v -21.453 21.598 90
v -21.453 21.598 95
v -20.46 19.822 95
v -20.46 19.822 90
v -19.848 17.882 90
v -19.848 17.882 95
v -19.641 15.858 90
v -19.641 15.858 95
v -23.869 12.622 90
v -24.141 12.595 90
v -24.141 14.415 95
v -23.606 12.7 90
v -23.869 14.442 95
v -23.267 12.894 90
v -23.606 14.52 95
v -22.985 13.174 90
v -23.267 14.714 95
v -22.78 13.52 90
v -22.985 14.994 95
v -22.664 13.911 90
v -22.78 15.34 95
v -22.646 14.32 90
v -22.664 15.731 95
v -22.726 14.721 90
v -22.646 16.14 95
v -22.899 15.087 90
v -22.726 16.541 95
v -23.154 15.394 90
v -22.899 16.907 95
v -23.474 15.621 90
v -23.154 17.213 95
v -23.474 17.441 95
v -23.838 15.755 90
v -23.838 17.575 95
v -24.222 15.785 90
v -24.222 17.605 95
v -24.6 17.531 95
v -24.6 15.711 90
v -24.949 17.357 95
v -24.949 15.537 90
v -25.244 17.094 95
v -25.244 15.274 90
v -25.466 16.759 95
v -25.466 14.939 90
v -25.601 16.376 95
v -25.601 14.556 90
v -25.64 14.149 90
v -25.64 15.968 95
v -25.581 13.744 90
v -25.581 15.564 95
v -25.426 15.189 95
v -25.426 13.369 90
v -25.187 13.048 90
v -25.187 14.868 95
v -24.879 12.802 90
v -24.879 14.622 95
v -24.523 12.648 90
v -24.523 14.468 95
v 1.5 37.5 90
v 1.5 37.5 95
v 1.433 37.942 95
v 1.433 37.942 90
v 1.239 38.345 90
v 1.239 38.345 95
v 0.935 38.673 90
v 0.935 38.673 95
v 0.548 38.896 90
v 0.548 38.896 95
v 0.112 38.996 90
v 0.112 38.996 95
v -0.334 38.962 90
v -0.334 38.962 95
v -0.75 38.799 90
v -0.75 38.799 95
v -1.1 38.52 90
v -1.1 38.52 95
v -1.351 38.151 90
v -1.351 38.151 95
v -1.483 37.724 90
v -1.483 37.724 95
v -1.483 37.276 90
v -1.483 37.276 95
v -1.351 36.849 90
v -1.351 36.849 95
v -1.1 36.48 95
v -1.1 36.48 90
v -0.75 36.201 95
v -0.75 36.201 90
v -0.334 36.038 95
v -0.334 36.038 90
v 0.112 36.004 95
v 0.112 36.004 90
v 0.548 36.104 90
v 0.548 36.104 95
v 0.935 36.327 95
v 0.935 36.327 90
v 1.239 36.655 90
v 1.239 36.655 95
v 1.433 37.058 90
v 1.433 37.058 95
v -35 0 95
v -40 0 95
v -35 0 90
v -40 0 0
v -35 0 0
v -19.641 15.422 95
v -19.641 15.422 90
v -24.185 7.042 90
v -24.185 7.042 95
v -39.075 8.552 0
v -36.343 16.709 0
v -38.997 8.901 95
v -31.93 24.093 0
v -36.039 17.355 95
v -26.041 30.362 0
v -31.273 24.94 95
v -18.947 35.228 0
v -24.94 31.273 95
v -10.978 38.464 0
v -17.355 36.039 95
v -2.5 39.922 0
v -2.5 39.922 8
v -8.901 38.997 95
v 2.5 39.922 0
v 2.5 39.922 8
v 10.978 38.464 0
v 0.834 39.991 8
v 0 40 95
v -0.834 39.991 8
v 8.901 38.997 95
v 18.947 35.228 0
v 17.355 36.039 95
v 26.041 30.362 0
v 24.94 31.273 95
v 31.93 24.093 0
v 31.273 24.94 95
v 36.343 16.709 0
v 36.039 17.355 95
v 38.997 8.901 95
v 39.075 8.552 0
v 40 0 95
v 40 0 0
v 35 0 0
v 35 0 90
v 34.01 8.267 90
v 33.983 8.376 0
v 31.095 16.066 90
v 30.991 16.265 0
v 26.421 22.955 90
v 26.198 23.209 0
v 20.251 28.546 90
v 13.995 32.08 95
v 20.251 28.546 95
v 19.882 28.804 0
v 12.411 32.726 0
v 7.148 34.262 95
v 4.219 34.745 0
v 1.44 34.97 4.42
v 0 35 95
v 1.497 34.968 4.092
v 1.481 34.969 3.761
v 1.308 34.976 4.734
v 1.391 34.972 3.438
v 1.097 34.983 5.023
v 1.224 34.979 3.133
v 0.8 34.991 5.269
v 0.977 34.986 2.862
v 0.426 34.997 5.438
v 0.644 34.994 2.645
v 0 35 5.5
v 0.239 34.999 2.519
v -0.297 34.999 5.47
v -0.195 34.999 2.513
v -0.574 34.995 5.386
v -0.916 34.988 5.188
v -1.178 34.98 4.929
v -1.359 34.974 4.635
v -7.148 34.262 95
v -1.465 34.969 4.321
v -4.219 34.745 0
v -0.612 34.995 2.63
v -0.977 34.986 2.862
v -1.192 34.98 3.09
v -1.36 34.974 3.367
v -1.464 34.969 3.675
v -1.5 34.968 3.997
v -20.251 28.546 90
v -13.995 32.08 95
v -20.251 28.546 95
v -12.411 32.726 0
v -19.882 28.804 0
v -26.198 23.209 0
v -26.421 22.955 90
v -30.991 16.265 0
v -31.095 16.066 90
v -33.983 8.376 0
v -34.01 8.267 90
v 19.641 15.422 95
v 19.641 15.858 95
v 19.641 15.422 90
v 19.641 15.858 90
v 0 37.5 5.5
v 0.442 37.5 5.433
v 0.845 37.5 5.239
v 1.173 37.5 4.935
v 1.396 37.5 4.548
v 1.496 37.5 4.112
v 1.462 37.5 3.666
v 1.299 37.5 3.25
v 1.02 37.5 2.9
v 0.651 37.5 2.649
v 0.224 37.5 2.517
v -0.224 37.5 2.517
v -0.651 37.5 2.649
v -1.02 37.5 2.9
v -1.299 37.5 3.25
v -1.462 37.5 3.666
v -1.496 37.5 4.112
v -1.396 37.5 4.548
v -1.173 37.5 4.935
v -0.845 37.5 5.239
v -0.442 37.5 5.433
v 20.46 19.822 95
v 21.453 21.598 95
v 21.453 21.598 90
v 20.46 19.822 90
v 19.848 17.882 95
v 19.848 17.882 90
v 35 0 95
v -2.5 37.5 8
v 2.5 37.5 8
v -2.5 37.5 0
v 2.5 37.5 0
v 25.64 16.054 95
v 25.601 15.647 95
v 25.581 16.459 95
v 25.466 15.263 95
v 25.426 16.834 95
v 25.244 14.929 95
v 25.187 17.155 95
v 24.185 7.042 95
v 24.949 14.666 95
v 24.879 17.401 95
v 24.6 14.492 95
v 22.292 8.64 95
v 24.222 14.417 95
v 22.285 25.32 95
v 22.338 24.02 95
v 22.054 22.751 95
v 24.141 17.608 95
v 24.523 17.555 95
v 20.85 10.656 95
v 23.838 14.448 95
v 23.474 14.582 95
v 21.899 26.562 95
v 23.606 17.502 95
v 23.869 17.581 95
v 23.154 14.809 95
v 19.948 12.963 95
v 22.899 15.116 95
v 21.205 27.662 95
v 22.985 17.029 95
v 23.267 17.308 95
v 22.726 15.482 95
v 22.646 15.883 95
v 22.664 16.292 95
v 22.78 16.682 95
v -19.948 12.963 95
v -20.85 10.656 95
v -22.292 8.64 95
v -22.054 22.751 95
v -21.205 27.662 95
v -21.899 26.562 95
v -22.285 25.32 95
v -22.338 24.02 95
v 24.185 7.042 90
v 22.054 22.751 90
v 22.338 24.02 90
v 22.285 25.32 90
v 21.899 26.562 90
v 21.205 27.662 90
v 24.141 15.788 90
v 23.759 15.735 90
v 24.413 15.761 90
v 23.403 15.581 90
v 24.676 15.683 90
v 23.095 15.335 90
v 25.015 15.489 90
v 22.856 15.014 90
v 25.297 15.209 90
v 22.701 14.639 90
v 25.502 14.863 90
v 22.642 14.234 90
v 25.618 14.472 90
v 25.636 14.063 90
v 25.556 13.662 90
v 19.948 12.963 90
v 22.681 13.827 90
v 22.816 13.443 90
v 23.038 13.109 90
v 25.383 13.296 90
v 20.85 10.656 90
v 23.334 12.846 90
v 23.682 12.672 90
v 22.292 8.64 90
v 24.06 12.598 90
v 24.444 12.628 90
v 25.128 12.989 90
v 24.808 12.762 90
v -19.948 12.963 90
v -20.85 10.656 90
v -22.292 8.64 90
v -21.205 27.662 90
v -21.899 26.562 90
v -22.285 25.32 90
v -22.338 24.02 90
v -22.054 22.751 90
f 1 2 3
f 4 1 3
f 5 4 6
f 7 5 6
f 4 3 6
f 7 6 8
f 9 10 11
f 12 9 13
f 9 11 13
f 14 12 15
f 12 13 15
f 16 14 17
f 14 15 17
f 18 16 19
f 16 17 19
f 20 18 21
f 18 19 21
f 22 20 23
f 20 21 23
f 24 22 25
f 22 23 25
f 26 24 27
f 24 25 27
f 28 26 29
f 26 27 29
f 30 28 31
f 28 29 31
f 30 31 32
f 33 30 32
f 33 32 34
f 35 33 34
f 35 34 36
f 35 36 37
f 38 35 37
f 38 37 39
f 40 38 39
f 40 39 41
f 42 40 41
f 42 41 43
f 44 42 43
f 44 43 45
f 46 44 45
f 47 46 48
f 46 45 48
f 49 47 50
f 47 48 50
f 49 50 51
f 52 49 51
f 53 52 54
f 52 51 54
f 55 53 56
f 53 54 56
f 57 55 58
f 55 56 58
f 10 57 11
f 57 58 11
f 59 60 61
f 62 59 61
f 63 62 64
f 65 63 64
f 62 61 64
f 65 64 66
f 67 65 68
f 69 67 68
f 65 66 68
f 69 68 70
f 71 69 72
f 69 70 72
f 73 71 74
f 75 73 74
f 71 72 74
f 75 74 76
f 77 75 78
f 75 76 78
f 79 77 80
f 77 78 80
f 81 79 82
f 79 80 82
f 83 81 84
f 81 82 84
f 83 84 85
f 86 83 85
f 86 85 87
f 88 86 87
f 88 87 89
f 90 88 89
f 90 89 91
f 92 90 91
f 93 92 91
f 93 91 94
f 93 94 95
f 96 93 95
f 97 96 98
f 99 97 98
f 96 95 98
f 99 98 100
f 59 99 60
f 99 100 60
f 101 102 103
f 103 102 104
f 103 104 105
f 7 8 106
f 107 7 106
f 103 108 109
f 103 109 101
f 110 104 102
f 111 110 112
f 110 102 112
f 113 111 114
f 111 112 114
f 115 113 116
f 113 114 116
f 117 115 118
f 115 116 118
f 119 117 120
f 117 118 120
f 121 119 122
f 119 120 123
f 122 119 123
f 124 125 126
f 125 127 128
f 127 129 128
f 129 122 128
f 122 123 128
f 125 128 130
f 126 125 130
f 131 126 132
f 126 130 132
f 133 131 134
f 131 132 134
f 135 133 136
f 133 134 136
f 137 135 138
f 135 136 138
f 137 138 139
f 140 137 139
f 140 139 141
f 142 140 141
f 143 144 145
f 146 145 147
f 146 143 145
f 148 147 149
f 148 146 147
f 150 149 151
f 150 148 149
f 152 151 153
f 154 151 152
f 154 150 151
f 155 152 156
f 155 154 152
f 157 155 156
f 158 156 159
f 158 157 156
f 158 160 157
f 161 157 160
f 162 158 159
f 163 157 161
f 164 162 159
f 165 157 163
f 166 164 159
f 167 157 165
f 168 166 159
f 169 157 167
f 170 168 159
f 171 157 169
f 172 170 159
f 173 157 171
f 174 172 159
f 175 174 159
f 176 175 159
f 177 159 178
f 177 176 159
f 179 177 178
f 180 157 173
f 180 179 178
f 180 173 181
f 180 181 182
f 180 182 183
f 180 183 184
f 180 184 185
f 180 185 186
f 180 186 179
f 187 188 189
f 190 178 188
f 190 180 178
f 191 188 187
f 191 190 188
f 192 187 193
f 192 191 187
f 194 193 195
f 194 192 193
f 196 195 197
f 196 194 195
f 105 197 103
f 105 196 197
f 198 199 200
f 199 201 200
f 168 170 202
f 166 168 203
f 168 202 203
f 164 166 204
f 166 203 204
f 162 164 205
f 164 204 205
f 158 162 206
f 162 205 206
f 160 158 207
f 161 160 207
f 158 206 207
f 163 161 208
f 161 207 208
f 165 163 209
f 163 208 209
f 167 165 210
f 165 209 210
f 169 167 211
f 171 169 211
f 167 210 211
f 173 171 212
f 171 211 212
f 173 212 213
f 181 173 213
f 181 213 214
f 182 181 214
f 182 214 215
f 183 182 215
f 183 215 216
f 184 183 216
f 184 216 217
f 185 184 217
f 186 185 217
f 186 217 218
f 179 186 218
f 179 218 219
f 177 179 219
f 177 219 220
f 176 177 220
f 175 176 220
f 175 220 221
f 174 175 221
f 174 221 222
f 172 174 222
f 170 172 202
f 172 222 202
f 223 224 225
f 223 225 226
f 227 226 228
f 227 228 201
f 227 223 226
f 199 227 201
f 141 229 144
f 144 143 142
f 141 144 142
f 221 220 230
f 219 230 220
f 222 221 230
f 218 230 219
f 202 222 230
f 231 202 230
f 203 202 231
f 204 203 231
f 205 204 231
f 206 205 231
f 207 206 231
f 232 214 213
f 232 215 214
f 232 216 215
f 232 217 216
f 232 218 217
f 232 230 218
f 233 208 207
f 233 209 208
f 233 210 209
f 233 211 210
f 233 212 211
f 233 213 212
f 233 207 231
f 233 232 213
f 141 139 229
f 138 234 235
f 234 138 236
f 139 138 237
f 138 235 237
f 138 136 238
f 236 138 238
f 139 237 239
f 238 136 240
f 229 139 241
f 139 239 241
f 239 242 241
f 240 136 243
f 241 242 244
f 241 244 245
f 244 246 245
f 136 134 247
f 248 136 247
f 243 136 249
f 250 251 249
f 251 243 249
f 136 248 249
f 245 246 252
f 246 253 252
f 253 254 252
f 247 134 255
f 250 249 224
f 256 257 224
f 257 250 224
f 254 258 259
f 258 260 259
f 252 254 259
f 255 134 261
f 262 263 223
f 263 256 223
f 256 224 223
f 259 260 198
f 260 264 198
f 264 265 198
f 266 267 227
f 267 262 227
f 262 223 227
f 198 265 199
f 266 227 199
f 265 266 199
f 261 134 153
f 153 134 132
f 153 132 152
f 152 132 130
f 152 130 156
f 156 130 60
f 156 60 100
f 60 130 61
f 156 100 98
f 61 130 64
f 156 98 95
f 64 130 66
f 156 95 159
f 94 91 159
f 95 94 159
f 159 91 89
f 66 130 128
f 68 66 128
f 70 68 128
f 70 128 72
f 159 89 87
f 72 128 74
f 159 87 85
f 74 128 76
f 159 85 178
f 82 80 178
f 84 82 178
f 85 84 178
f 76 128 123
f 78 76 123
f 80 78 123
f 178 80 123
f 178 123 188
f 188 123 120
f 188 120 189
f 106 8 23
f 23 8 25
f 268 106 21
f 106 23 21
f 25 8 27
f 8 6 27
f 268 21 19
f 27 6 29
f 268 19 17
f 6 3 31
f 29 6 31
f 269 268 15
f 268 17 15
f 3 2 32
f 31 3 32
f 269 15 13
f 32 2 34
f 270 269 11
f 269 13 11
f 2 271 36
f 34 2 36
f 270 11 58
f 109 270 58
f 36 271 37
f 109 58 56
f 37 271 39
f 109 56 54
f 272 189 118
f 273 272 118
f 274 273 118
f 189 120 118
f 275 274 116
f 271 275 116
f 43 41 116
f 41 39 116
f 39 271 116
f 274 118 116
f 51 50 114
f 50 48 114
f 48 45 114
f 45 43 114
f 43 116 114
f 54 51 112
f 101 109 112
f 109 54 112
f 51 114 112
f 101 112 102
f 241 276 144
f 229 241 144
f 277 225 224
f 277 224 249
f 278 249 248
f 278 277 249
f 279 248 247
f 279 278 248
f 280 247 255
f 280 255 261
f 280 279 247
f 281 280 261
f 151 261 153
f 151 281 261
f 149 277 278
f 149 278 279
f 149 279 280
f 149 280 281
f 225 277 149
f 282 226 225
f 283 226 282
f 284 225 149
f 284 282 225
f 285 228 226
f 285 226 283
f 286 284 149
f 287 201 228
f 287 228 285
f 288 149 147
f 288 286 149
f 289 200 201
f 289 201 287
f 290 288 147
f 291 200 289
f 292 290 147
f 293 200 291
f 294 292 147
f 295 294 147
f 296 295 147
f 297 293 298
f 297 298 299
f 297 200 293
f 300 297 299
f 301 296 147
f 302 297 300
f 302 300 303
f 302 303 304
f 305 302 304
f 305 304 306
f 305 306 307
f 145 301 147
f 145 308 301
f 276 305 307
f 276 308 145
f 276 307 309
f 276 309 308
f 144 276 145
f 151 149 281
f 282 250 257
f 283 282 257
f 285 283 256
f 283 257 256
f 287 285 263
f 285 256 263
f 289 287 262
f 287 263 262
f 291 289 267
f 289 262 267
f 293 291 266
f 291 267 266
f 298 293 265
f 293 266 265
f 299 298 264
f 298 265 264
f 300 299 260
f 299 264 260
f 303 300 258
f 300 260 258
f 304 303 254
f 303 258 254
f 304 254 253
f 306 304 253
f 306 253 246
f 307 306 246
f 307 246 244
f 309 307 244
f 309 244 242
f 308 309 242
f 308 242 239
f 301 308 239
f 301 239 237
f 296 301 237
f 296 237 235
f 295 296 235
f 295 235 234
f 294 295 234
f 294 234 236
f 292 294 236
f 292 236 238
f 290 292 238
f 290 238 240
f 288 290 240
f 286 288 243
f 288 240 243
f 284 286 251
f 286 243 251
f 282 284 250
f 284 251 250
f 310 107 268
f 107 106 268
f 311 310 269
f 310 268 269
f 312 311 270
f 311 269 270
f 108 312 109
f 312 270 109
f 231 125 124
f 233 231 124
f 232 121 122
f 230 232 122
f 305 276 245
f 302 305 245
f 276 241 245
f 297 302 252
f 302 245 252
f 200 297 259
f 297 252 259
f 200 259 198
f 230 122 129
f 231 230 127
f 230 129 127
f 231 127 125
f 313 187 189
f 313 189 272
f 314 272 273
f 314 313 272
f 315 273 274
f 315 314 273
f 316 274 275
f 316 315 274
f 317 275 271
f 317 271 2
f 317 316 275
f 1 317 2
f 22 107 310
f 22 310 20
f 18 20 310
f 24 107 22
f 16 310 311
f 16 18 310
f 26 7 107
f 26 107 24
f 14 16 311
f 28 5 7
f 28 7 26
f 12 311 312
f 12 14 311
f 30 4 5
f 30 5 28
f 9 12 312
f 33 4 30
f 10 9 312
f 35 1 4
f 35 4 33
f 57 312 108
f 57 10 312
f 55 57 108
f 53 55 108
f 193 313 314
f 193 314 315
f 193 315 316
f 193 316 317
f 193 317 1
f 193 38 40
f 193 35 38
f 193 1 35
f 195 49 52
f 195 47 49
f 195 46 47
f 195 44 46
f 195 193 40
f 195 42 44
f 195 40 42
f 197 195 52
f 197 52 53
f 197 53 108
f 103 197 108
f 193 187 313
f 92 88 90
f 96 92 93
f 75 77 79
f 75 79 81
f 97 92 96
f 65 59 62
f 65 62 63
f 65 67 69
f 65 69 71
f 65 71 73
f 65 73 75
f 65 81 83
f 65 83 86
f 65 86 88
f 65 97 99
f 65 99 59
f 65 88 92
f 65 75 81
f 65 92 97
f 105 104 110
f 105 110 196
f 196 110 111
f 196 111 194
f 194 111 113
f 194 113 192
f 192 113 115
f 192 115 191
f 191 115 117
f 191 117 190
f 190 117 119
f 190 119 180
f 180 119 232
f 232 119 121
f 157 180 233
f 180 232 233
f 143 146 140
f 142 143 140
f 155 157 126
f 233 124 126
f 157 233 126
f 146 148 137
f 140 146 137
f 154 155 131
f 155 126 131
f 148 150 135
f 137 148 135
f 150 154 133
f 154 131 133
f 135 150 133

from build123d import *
from OCP.BRepFilletAPI import BRepFilletAPI_MakeChamfer

# Parameters (mm, degrees)
SALIENTE_EXTRUIR1_DEPTH = 95
VACIADO1_T              = -5
CORTAR_EXTRUIR1_DEPTH   = 2.5
CROQUIS3_R              = 1.5
CORTAR_EXTRUIR4_DEPTH   = 5
SALIENTE_EXTRUIR2_DEPTH = 5
CHAFL_N1_SIZE           = 5
CHAFL_N1_SIZE2          = 1.819851171331016
CROQUIS5_R              = 1.5000000000000009
CORTAR_EXTRUIR5_DEPTH   = 107.86778586495213
CROQUIS6_W              = 80
CROQUIS6_H              = 6.500000000000014
CORTAR_EXTRUIR6_DEPTH   = 115.89125293076057
SALIENTE_EXTRUIR3_START = -5
SALIENTE_EXTRUIR3_DEPTH = 5
REDONDEO1_R             = 10
REDONDEO2_R             = 5
CROQUIS8_R              = 1.5000000000000004
CORTAR_EXTRUIR7_DEPTH   = 5


with BuildPart() as part:
    # Croquis1 → Saliente-Extruir1 (new body)
    with BuildSketch(Plane.XY):
        with BuildLine():
            Line((-40, 0), (40, 0))
            ThreePointArc((40, 0), (2.45e-15, 40), (-40, 0))
        make_face()
    extrude(amount=SALIENTE_EXTRUIR1_DEPTH)

    # Vaciado1
    vaciado1_openings = [part.faces().sort_by_distance(p)[0] for p in [
        (0, 16.976527263, 95),
        (0, 16.976527263, 0),
        (0, 0, 47.5),
    ]]
    offset(amount=VACIADO1_T, openings=vaciado1_openings)

    # Croquis2 → Cortar-Extruir1 (cut)
    with BuildSketch(Plane(origin=(0, 40, 0), x_dir=(1, 0, 0), z_dir=(0, 1, 0))):
        Polygon((2.499999999999998, 8), (-2.500000000000002, 8), (-2.499999999999997, -8), (2.500000000000003, -8), align=None)
    extrude(amount=-CORTAR_EXTRUIR1_DEPTH, mode=Mode.SUBTRACT)

    # Croquis3 → Cortar-Extruir4 (cut)
    with BuildSketch(Plane(origin=(0, 37.5, 0), x_dir=(1, 0, 0), z_dir=(0, 1, 0))):
        with Locations(Location((3.04e-15, -4.0000000000000036, 0), (0, 0, 270))):
            Circle(CROQUIS3_R)
    extrude(amount=-CORTAR_EXTRUIR4_DEPTH, mode=Mode.SUBTRACT)

    # Croquis4 → Saliente-Extruir2 (add, symmetric)
    with BuildSketch(Plane.XY.offset(95)):
        with BuildLine():
            Line((34.64101615137755, 20), (19.641016151377546, 20))
            Line((19.641016151377546, 20), (19.641016151377542, 9.999999999999998))
            Line((19.641016151377542, 9.999999999999998), (38.72983346207417, 10))
            ThreePointArc((38.72983346207417, 10), (37.024591736438325, 15.138679161342415), (34.64101615137755, 20))
        make_face()
        with BuildLine():
            Line((-19.641016151377542, 9.999999999999998), (-38.72983346207417, 10))
            ThreePointArc((-38.72983346207417, 10), (-37.024591736438325, 15.138679161342413), (-34.64101615137755, 20))
            Line((-34.64101615137755, 20), (-19.641016151377546, 20))
            Line((-19.641016151377546, 20), (-19.641016151377542, 9.999999999999998))
        make_face()
    extrude(amount=SALIENTE_EXTRUIR2_DEPTH, both=True)

    # Chaflán1: one chamfer whose edges measure the first distance from different faces: ONE call of the kernel's chamfer builder (chamfer() names one face for all edges)
    chafl_n1_edges_1 = [part.edges().sort_by_distance(p)[0] for p in [
        (27.14101615137755, 20, 100),
    ]]
    chafl_n1_side_1 = [part.faces().sort_by_distance(p)[0] for p in [
        (28.335600223521073, 14.80398786251226, 100),
    ]]
    chafl_n1_edges_2 = [part.edges().sort_by_distance(p)[0] for p in [
        (-27.14101615137755, 20, 100),
    ]]
    chafl_n1_side_2 = [part.faces().sort_by_distance(p)[0] for p in [
        (-28.33560022352108, 14.803987862512262, 100),
    ]]
    chafl_n1 = BRepFilletAPI_MakeChamfer(part.part.solid().wrapped)
    for e in chafl_n1_edges_1:
        chafl_n1.Add(CHAFL_N1_SIZE, CHAFL_N1_SIZE2, e.wrapped, chafl_n1_side_1[0].wrapped)  # the first distance lies on this face
    for e in chafl_n1_edges_2:
        chafl_n1.Add(CHAFL_N1_SIZE, CHAFL_N1_SIZE2, e.wrapped, chafl_n1_side_2[0].wrapped)  # the first distance lies on this face
    add(Compound.cast(chafl_n1.Shape()), mode=Mode.REPLACE)

    # Croquis5 → Cortar-Extruir5 (cut, through all)
    with BuildSketch(Plane(origin=(0, 33.89404716093429, 93.12312922859813), x_dir=(1, 0, 0), z_dir=(0, 0.3420201433256652, 0.9396926207859096))):
        with Locations(Location((-24.141016151377546, -17.446180589588106, 0), (0, 0, 270))):
            Circle(CROQUIS5_R)
        with Locations(Location((24.141016151377546, -17.446180589588106, 0), (0, 0, 90))):
            Circle(CROQUIS5_R)
    extrude(amount=-CORTAR_EXTRUIR5_DEPTH, mode=Mode.SUBTRACT)

    # Croquis6 → Cortar-Extruir6 (cut, through all)
    with BuildSketch(Plane(origin=(0, 0, 0), x_dir=(1, 0, 0), z_dir=(0, 1, 0))):
        with Locations((0, -98.25)):
            Rectangle(CROQUIS6_W, CROQUIS6_H)
    extrude(amount=CORTAR_EXTRUIR6_DEPTH, mode=Mode.SUBTRACT)

    # Croquis7 → Saliente-Extruir3 (add)
    with BuildSketch(Plane.XY.offset(95).offset(SALIENTE_EXTRUIR3_START)):
        with BuildLine():
            Line((19.641016151377542, 9.999999999999998), (35, 0))
            ThreePointArc((35, 0), (34.633334290733465, 5.052935375235389), (33.54101966249685, 10))
            Line((33.54101966249685, 10), (19.641016151377542, 9.999999999999998))
        make_face()
        with BuildLine():
            Line((-19.641016151377542, 9.999999999999998), (-35, 0))
            ThreePointArc((-35, 0), (-34.63333429073347, 5.0529353752354), (-33.54101966249685, 10))
            Line((-33.54101966249685, 10), (-19.641016151377542, 9.999999999999998))
        make_face()
        with BuildLine():
            Line((-19.641016151377546, 20), (-28.722813232690147, 20))
            ThreePointArc((-28.722813232690147, 20), (-26.75936830732511, 22.559614531124524), (-24.568594519878932, 24.927578368501326))
            Line((-24.568594519878932, 24.927578368501326), (-19.641016151377546, 20))
        make_face()
        with BuildLine():
            Line((19.641016151377546, 20), (28.722813232690147, 20))
            ThreePointArc((28.722813232690147, 20), (26.75936830732511, 22.559614531124524), (24.568594519878932, 24.927578368501326))
            Line((24.568594519878932, 24.927578368501326), (19.641016151377546, 20))
        make_face()
    extrude(amount=SALIENTE_EXTRUIR3_DEPTH)

    # Redondeo1
    redondeo1_edges = [part.edges().sort_by_distance(p)[0] for p in [
        (-19.641016151377546, 20, 92.5),
        (-19.641016151377542, 9.999999999999998, 92.5),
        (19.641016151377542, 9.999999999999998, 92.5),
        (19.641016151377546, 20, 92.5),
    ]]
    fillet(redondeo1_edges, radius=REDONDEO1_R)

    # Redondeo2
    # the kernel refuses this fillet: 5 mm, written as the material it adds along each edge
    with BuildSketch(Plane(origin=(24.568594519878932, 24.927578368501326, 90), x_dir=(-0.7663954409927094, 0.6423690746180039, 0), z_dir=(0, 0, 1))) as redondeo2_piece_1:
        with BuildLine():
            CenterArc((5.230741996241704, 4.983783963286785), REDONDEO2_R, 184.9379912398929, 89.6777604033997)
            Line((0.2492997983567551, 4.553396197276695), (-0.24884442143173913, 4.510357420675686))
            ThreePointArc((-0.24884442143173913, 4.510357420675686), (-0.2501886476220602, 2.859471760516391), (-0.4980734710416599, 0.04384994235474339))
            Line((-0.4980734710416599, 0.04384994235474339), (-0.04023647689416843, -0.49837839632867914))
            ThreePointArc((-0.04023647689416843, -0.49837839632867914), (2.816553382591687, -0.6135122569925113), (5.673343242077539, -0.49837839632867886))
            Line((5.673343242077539, -0.49837839632867886), (5.633106765183373, 2.3e-16))
        make_face()
    extrude(amount=5)
    with BuildSketch(Plane(origin=(-24.568594519878932, 24.927578368501326, 90), x_dir=(0.7663954409927088, 0.6423690746180043, 0), z_dir=(0, 0, 1))) as redondeo2_piece_2:
        with BuildLine():
            CenterArc((5.2307419962416954, -4.9837839632867835), REDONDEO2_R, 85.38424835670739, 89.67776040339973)
            Line((0.24929979835674423, -4.553396197276693), (-0.24884442143174967, -4.510357420675684))
            ThreePointArc((-0.24884442143174967, -4.510357420675684), (-0.2501886476220599, -2.8594717605163877), (-0.4980734710416599, -0.04384994235474303))
            Line((-0.4980734710416599, -0.04384994235474303), (-0.0402364768941681, 0.4983783963286791))
            ThreePointArc((-0.0402364768941681, 0.4983783963286791), (2.816553382591687, 0.6135122569925143), (5.673343242077529, 0.49837839632867875))
            Line((5.673343242077529, 0.49837839632867875), (5.633106765183362, 3.7e-16))
        make_face()
    extrude(amount=5)

    # Croquis8 → Cortar-Extruir7 (cut)
    with BuildSketch(Plane.XY.offset(95)):
        with Locations((2.3e-15, 37.50000000000001)):
            Circle(CROQUIS8_R)
    extrude(amount=-CORTAR_EXTRUIR7_DEPTH, mode=Mode.SUBTRACT)


solid = part.part
